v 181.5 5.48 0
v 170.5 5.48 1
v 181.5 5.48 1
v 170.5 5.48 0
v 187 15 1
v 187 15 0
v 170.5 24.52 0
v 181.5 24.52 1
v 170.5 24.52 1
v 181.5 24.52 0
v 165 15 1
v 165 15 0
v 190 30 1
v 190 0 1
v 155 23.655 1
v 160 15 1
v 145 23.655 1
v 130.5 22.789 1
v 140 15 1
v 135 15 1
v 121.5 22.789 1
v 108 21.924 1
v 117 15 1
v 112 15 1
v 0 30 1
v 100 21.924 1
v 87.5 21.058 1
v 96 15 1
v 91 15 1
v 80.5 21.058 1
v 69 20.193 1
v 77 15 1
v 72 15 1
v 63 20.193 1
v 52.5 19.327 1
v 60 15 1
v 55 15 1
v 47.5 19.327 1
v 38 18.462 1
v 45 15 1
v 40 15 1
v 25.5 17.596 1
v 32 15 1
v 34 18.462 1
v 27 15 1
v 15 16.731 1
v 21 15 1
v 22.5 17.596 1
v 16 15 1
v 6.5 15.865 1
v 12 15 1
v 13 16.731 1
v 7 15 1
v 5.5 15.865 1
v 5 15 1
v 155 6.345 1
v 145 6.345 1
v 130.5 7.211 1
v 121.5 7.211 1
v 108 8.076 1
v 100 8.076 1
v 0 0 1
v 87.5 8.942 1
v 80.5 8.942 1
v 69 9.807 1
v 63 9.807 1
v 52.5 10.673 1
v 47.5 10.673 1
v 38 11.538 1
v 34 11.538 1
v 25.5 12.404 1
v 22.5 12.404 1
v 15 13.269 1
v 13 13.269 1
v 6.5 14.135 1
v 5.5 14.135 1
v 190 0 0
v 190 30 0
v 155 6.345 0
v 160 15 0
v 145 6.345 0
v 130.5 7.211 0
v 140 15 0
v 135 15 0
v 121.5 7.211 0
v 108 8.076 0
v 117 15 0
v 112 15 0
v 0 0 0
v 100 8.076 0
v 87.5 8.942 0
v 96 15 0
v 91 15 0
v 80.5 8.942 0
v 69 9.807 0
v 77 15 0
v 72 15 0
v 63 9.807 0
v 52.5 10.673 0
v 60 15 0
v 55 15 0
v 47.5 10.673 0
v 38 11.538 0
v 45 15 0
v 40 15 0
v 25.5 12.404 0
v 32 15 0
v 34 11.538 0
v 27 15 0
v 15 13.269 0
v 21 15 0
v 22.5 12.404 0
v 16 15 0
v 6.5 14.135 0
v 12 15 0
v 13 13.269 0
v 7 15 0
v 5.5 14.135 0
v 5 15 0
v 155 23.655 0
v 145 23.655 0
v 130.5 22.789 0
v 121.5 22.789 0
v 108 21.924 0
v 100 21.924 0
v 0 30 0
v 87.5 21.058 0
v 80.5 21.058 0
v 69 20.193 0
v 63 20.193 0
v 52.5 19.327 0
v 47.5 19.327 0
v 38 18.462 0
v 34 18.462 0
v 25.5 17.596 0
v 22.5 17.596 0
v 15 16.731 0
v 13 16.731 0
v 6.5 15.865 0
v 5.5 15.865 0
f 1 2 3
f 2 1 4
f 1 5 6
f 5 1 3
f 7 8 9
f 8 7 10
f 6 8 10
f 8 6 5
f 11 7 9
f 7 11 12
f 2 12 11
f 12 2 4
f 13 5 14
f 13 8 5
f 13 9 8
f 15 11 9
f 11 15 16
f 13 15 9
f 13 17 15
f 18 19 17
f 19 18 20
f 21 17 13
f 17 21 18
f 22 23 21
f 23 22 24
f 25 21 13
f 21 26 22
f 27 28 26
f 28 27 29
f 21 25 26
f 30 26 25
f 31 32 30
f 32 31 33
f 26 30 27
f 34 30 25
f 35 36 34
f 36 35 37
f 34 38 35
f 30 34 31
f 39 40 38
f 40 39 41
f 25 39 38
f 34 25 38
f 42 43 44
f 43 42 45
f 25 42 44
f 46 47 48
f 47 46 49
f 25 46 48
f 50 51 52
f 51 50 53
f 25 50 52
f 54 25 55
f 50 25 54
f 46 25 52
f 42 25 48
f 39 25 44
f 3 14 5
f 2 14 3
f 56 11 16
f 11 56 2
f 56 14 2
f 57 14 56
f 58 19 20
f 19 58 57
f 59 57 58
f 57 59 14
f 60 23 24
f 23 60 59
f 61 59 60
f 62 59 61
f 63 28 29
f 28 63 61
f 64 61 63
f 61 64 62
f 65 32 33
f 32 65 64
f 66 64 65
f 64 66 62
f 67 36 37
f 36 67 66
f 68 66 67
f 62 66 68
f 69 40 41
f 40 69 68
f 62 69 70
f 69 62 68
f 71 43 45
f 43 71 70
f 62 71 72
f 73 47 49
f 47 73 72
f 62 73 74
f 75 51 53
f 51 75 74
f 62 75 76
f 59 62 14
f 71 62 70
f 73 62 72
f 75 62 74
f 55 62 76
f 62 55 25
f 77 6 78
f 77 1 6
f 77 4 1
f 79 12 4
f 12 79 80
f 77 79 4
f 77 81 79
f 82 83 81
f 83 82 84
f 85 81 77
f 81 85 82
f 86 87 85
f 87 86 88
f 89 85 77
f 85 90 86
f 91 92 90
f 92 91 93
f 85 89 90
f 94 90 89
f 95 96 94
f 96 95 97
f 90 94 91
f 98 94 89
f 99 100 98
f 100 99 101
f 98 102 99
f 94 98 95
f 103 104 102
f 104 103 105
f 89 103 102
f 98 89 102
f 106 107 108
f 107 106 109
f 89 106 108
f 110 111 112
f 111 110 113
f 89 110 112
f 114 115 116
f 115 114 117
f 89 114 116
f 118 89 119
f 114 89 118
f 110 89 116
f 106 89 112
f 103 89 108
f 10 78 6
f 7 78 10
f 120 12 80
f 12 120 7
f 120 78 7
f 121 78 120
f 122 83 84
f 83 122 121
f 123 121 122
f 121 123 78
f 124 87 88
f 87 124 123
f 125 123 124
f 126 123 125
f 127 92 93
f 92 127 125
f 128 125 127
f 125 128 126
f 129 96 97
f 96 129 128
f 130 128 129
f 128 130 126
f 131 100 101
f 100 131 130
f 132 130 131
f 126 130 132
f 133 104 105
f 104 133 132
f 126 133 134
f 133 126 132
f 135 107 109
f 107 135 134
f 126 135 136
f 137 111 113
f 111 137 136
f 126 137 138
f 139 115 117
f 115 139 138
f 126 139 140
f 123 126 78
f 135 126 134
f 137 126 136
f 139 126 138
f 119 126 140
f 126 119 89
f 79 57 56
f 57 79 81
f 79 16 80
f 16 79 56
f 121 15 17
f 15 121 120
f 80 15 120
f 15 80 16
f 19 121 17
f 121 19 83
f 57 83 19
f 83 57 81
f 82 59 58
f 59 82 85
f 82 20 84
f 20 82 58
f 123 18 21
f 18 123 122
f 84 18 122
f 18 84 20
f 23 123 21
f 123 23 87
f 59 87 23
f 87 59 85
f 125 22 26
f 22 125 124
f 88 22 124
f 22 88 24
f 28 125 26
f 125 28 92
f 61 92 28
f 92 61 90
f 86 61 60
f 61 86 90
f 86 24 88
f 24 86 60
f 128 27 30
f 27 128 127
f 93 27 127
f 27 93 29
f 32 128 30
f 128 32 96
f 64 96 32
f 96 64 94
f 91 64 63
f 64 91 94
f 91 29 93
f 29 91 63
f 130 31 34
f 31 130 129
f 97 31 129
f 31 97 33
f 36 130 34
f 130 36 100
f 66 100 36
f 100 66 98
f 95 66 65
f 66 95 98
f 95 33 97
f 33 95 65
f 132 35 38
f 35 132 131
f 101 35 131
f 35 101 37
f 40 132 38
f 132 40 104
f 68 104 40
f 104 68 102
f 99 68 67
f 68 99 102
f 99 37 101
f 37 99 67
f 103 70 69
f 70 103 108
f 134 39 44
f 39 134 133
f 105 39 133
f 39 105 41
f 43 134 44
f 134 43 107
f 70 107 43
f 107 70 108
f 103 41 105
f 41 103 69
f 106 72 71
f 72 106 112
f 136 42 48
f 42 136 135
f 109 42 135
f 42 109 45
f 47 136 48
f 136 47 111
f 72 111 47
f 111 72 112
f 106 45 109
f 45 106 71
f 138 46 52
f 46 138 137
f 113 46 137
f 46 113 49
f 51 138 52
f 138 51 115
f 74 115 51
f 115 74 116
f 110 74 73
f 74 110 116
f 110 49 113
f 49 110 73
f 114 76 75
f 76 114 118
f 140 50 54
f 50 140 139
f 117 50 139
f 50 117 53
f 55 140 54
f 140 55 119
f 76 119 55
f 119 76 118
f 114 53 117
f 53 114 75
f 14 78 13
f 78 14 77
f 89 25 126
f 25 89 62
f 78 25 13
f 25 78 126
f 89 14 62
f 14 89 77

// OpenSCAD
difference() {
  translate([95.0000000000, 15.0000000000, 0.5000000000]) {
    scale([190.0000000000, 30.0000000000, 1.0000000000]) {
      translate([-0.5000000000, -0.5000000000, -0.5000000000]) {
        cube([1, 1, 1]);
      }
    }
  }
  union() {
    union() {
      union() {
        union() {
          union() {
            union() {
              union() {
                union() {
                  union() {
                    union() {
                      translate([176.0000000000, 15.0000111140, 0.5000000000]) {
                        scale([22.0000000000, 19.0520000000, 1.0000000000]) {
                          rotate([0.0000000000, 0.0000000000, -0.0000000000]) {
                            scale([0.5, 0.577, 1]) cylinder($fn = 6, center = true);
                          }
                        }
                      }
                      translate([150.0000000000, 14.9999946600, 0.5000000000]) {
                        scale([20.0000000000, 17.3200000000, 1.0000000000]) {
                          rotate([0.0000000000, 0.0000000000, -0.0000000000]) {
                            scale([0.5, 0.577, 1]) cylinder($fn = 6, center = true);
                          }
                        }
                      }
                    }
                    translate([126.0000000000, 15.0000128460, 0.5000000000]) {
                      scale([18.0000000000, 15.5880000000, 1.0000000000]) {
                        rotate([0.0000000000, 0.0000000000, -0.0000000000]) {
                          scale([0.5, 0.577, 1]) cylinder($fn = 6, center = true);
                        }
                      }
                    }
                  }
                  translate([104.0000000000, 15.0000000000, 0.5000000000]) {
                    scale([16.0000000000, 13.8560000000, 1.0000000000]) {
                      rotate([0.0000000000, 0.0000000000, -0.0000000000]) {
                        scale([0.5, 0.577, 1]) cylinder($fn = 6, center = true);
                      }
                    }
                  }
                }
                translate([84.0000000000, 15.0000000000, 0.5000000000]) {
                  scale([14.0000000000, 12.1240000000, 1.0000000000]) {
                    rotate([0.0000000000, 0.0000000000, -0.0000000000]) {
                      scale([0.5, 0.577, 1]) cylinder($fn = 6, center = true);
                    }
                  }
                }
              }
              translate([66.0000000000, 15.0000000000, 0.5000000000]) {
                scale([12.0000000000, 10.3920000000, 1.0000000000]) {
                  rotate([0.0000000000, 0.0000000000, -0.0000000000]) {
                    scale([0.5, 0.577, 1]) cylinder($fn = 6, center = true);
                  }
                }
              }
            }
            translate([50.0000000000, 15.0000000000, 0.5000000000]) {
              scale([10.0000000000, 8.6600000000, 1.0000000000]) {
                rotate([0.0000000000, 0.0000000000, -0.0000000000]) {
                  scale([0.5, 0.577, 1]) cylinder($fn = 6, center = true);
                }
              }
            }
          }
          translate([36.0000000000, 15.0000000000, 0.5000000000]) {
            scale([8.0000000000, 6.9280000000, 1.0000000000]) {
              rotate([0.0000000000, 0.0000000000, -0.0000000000]) {
                scale([0.5, 0.577, 1]) cylinder($fn = 6, center = true);
              }
            }
          }
        }
        translate([24.0000000000, 15.0000000000, 0.5000000000]) {
          scale([6.0000000000, 5.1960000000, 1.0000000000]) {
            rotate([0.0000000000, 0.0000000000, -0.0000000000]) {
              scale([0.5, 0.577, 1]) cylinder($fn = 6, center = true);
            }
          }
        }
      }
      translate([14.0000000000, 15.0000000000, 0.5000000000]) {
        scale([4.0000000000, 3.4640000000, 1.0000000000]) {
          rotate([0.0000000000, 0.0000000000, -0.0000000000]) {
            scale([0.5, 0.577, 1]) cylinder($fn = 6, center = true);
          }
        }
      }
    }
    translate([6.0000000000, 15.0000000000, 0.5000000000]) {
      scale([2.0000000000, 1.7320000000, 1.0000000000]) {
        rotate([0.0000000000, 0.0000000000, -0.0000000000]) {
          scale([0.5, 0.577, 1]) cylinder($fn = 6, center = true);
        }
      }
    }
  }
}
